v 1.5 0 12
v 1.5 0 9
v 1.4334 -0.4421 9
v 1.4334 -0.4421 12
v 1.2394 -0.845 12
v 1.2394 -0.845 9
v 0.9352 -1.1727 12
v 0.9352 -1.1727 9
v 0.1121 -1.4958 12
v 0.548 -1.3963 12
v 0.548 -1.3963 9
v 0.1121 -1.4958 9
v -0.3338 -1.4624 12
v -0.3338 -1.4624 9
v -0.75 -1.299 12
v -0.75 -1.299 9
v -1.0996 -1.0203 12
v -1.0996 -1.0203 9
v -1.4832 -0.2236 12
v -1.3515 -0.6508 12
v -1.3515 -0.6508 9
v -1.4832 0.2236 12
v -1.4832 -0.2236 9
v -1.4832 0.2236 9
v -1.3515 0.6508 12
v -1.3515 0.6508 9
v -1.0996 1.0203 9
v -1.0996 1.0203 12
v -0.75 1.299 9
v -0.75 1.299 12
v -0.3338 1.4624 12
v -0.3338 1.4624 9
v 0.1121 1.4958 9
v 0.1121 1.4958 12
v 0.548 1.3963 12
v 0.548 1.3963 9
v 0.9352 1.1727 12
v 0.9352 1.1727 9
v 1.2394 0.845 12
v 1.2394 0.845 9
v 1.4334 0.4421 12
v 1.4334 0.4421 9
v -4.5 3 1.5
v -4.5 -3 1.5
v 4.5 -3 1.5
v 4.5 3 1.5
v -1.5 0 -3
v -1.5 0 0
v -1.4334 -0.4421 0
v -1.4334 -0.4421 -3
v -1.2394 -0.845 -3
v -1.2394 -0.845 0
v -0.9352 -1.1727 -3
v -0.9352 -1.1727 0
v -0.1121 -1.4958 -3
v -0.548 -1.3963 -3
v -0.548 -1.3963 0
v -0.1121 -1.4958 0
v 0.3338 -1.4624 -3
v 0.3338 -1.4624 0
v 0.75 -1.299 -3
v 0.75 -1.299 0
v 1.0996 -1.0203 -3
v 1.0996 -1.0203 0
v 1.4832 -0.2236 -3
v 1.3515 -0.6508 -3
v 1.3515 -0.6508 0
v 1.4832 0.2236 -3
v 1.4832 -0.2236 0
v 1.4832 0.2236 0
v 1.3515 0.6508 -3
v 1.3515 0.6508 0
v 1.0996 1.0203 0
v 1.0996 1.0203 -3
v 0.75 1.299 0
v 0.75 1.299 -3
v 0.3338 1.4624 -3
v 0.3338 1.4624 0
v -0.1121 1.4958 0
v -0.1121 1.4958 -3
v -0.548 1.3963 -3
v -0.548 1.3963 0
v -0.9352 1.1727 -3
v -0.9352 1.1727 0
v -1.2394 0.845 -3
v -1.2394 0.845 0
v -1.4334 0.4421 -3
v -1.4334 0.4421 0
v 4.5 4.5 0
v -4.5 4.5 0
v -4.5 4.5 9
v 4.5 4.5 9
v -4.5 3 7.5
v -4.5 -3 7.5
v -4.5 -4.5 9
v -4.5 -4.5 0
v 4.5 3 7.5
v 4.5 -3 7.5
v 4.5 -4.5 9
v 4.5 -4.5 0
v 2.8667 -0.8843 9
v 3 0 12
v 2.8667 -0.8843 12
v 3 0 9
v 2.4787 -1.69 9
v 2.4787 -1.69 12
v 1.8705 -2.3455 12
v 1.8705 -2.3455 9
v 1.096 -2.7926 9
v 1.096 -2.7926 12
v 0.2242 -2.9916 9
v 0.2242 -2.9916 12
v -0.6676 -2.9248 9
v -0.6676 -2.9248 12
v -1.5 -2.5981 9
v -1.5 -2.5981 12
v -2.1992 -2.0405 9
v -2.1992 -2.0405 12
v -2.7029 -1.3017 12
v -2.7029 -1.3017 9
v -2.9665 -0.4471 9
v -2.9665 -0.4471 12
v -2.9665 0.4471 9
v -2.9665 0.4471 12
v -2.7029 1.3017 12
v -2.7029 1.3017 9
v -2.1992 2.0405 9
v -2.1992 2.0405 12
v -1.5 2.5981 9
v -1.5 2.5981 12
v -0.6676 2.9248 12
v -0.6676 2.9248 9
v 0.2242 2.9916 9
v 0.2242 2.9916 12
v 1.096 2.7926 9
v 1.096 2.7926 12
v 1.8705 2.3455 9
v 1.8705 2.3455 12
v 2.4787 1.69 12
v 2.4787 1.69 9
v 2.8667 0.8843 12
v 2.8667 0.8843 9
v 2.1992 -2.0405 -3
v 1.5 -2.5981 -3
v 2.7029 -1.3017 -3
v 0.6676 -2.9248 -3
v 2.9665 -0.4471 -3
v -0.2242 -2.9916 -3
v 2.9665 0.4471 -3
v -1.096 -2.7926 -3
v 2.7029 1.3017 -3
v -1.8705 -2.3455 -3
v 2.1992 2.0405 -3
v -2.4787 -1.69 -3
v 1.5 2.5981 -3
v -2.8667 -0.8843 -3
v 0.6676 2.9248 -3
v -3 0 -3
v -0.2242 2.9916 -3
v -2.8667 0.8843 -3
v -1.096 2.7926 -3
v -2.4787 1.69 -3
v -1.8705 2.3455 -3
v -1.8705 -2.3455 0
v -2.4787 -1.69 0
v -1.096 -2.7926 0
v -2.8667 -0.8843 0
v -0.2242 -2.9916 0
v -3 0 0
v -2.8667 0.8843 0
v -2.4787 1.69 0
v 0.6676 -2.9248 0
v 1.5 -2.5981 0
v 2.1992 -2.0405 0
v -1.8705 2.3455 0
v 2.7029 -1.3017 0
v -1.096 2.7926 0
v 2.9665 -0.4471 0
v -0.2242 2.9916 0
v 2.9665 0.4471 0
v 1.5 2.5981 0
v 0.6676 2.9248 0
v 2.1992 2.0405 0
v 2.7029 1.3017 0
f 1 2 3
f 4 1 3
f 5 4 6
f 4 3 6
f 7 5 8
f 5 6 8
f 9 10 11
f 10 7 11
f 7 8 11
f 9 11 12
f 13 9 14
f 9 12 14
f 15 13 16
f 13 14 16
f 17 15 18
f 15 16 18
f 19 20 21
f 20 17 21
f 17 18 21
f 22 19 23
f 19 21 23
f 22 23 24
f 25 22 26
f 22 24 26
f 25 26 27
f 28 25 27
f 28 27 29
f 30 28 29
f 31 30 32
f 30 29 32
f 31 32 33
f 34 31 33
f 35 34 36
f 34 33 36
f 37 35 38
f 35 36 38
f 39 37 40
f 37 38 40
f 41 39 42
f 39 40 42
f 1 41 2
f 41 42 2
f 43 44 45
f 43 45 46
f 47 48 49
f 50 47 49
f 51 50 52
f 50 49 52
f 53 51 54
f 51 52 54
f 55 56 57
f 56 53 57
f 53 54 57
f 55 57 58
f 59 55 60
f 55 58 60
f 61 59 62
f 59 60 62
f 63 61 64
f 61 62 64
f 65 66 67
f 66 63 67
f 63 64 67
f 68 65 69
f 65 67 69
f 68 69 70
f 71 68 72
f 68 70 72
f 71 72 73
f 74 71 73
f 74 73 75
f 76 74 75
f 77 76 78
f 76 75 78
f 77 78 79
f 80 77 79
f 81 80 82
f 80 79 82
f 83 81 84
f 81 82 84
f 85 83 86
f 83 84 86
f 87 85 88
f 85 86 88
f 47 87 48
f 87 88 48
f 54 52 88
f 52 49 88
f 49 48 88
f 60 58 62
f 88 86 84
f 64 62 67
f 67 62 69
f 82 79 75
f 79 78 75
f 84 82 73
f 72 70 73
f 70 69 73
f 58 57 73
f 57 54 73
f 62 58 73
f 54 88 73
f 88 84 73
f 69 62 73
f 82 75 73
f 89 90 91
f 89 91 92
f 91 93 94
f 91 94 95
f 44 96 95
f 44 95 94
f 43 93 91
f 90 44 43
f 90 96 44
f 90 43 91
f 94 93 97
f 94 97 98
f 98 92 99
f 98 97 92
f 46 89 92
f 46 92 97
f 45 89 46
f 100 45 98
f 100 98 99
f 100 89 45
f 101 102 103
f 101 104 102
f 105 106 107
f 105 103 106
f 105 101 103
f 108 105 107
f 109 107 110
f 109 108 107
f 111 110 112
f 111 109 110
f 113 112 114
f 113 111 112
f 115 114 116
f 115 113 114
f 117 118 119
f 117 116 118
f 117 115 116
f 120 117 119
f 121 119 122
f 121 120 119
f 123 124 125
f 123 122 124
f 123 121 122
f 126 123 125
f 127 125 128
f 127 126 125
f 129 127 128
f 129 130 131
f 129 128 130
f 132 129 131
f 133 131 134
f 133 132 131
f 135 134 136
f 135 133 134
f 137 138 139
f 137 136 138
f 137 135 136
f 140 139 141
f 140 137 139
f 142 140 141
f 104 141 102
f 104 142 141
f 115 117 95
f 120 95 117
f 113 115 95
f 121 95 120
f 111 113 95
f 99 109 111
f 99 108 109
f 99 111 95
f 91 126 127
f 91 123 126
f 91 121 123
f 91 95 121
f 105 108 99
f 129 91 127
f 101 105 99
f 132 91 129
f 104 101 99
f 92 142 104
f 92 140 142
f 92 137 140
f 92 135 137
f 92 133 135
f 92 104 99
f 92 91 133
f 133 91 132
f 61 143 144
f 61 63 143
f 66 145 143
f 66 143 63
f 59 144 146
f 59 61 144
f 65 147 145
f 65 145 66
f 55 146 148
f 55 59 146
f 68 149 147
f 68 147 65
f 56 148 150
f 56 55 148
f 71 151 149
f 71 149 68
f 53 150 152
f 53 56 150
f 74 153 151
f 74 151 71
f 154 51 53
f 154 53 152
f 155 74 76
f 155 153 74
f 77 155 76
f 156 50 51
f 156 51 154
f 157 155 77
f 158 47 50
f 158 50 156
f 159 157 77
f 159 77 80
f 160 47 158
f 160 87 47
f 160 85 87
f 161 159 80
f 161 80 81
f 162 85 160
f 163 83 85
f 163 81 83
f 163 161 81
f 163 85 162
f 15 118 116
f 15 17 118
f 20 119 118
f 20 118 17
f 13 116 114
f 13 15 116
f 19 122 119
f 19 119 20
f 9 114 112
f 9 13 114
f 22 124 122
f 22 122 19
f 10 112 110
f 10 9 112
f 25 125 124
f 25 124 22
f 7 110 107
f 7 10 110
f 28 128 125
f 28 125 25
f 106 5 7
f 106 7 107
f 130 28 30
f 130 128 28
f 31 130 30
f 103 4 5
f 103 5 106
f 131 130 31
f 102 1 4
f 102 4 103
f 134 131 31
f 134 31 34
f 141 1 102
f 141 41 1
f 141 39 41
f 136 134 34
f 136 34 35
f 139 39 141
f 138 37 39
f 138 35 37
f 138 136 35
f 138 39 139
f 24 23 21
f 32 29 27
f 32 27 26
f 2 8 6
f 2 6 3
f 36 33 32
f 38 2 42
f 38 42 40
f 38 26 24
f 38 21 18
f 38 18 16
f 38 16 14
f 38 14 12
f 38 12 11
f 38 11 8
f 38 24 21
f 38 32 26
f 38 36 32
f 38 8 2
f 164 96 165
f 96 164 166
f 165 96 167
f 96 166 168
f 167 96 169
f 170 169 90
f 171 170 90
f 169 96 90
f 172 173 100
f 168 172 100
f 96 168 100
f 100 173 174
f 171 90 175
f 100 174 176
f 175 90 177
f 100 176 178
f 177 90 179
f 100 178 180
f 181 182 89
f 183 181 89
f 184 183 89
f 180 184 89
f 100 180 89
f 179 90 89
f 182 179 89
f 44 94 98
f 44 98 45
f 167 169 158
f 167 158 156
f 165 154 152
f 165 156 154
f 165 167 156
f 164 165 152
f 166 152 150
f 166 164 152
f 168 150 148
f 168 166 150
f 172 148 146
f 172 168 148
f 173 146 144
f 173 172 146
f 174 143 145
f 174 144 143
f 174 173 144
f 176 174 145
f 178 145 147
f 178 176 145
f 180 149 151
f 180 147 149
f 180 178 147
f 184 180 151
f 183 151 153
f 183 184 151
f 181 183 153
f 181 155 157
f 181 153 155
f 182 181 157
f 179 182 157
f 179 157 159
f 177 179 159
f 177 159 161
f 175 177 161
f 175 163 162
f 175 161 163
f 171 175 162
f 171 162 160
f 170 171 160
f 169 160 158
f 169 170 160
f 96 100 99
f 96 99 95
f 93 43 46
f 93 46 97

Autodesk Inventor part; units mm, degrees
ref_plane "YZ Plane" through (0, 0, 0) normal (1, 0, 0) x (0, 1, 0)
ref_plane "XZ Plane" through (0, 0, 0) normal (0, 1, 0) x (-1, 0, 0)
ref_plane "XY Plane" through (0, 0, 0) normal (0, 0, 1) x (1, 0, 0)
sketch "Náčrt1" plane through (0, 0, 0) normal (0, 0, 1) x (1, 0, 0)
  line L0 (4.5, 0) -> (4.5, -4.5)
  line L1 (4.5, -4.5) -> (-4.5, -4.5)
  line L2 (-4.5, -4.5) -> (-4.5, 4.5)
  line L3 (-4.5, 4.5) -> (4.5, 4.5)
  line L4 (4.5, 4.5) -> (4.5, -4.5)
  circle A0 centre (0, 0) radius 3
  circle A1 centre (0, 0) radius 1.5
  dimension "d1" = 4.5
  dimension "d2" = 9
  dimension "d3" = 9
  dimension "d4" = 9
  dimension "d5" = 6
  dimension "d6" = 3
extrude "Vysunutí1" add sketch "Náčrt1" along normal blind 9 contours L0 L1 L2 L3 L4 | A0 | A1
sketch "Náčrt2" plane through (0, 0, 9) normal (0, 0, 1) x (1, 0, 0)
  circle A0 centre (0, 0) radius 3
  circle A1 centre (0, 0) radius 1.5
  dimension "d9" = 6
  dimension "d10" = 3
extrude "Vysunutí2" add sketch "Náčrt2" along normal blind 3
sketch "Náčrt3" plane through (0, 0, 0) normal (0, 0, -1) x (-1, 0, 0)
  circle A0 centre (0, 0) radius 3
  circle A1 centre (0, 0) radius 1.5
  dimension "d13" = 6
  dimension "d14" = 3
extrude "Vysunutí3" add sketch "Náčrt3" along normal blind 3
sketch "Náčrt4" plane through (-4.5, -4.5, 0) normal (-1, 0, 0) x (0, 0, 1)
  line L0 (0, 9) -> (0, 0) projected
  line L1 (0, 0) -> (9, 0) projected
  line L2 (1.5, 0) -> (1.5, 1.5)
  line L3 (1.5, 1.5) -> (1.5, 7.5)
  line L4 (1.5, 7.5) -> (7.5, 7.5)
  line L5 (7.5, 7.5) -> (7.5, 1.5)
  line L6 (7.5, 1.5) -> (1.5, 1.5)
  point P0 (0, 4.5)
  dimension "d18" = 1.5
  dimension "d19" = 6
  dimension "d20" = 6
  dimension "d21" = 6
extrude "Vysunutí4" cut sketch "Náčrt4" against normal blind 9
properties part number "Osa_rameno _1"
